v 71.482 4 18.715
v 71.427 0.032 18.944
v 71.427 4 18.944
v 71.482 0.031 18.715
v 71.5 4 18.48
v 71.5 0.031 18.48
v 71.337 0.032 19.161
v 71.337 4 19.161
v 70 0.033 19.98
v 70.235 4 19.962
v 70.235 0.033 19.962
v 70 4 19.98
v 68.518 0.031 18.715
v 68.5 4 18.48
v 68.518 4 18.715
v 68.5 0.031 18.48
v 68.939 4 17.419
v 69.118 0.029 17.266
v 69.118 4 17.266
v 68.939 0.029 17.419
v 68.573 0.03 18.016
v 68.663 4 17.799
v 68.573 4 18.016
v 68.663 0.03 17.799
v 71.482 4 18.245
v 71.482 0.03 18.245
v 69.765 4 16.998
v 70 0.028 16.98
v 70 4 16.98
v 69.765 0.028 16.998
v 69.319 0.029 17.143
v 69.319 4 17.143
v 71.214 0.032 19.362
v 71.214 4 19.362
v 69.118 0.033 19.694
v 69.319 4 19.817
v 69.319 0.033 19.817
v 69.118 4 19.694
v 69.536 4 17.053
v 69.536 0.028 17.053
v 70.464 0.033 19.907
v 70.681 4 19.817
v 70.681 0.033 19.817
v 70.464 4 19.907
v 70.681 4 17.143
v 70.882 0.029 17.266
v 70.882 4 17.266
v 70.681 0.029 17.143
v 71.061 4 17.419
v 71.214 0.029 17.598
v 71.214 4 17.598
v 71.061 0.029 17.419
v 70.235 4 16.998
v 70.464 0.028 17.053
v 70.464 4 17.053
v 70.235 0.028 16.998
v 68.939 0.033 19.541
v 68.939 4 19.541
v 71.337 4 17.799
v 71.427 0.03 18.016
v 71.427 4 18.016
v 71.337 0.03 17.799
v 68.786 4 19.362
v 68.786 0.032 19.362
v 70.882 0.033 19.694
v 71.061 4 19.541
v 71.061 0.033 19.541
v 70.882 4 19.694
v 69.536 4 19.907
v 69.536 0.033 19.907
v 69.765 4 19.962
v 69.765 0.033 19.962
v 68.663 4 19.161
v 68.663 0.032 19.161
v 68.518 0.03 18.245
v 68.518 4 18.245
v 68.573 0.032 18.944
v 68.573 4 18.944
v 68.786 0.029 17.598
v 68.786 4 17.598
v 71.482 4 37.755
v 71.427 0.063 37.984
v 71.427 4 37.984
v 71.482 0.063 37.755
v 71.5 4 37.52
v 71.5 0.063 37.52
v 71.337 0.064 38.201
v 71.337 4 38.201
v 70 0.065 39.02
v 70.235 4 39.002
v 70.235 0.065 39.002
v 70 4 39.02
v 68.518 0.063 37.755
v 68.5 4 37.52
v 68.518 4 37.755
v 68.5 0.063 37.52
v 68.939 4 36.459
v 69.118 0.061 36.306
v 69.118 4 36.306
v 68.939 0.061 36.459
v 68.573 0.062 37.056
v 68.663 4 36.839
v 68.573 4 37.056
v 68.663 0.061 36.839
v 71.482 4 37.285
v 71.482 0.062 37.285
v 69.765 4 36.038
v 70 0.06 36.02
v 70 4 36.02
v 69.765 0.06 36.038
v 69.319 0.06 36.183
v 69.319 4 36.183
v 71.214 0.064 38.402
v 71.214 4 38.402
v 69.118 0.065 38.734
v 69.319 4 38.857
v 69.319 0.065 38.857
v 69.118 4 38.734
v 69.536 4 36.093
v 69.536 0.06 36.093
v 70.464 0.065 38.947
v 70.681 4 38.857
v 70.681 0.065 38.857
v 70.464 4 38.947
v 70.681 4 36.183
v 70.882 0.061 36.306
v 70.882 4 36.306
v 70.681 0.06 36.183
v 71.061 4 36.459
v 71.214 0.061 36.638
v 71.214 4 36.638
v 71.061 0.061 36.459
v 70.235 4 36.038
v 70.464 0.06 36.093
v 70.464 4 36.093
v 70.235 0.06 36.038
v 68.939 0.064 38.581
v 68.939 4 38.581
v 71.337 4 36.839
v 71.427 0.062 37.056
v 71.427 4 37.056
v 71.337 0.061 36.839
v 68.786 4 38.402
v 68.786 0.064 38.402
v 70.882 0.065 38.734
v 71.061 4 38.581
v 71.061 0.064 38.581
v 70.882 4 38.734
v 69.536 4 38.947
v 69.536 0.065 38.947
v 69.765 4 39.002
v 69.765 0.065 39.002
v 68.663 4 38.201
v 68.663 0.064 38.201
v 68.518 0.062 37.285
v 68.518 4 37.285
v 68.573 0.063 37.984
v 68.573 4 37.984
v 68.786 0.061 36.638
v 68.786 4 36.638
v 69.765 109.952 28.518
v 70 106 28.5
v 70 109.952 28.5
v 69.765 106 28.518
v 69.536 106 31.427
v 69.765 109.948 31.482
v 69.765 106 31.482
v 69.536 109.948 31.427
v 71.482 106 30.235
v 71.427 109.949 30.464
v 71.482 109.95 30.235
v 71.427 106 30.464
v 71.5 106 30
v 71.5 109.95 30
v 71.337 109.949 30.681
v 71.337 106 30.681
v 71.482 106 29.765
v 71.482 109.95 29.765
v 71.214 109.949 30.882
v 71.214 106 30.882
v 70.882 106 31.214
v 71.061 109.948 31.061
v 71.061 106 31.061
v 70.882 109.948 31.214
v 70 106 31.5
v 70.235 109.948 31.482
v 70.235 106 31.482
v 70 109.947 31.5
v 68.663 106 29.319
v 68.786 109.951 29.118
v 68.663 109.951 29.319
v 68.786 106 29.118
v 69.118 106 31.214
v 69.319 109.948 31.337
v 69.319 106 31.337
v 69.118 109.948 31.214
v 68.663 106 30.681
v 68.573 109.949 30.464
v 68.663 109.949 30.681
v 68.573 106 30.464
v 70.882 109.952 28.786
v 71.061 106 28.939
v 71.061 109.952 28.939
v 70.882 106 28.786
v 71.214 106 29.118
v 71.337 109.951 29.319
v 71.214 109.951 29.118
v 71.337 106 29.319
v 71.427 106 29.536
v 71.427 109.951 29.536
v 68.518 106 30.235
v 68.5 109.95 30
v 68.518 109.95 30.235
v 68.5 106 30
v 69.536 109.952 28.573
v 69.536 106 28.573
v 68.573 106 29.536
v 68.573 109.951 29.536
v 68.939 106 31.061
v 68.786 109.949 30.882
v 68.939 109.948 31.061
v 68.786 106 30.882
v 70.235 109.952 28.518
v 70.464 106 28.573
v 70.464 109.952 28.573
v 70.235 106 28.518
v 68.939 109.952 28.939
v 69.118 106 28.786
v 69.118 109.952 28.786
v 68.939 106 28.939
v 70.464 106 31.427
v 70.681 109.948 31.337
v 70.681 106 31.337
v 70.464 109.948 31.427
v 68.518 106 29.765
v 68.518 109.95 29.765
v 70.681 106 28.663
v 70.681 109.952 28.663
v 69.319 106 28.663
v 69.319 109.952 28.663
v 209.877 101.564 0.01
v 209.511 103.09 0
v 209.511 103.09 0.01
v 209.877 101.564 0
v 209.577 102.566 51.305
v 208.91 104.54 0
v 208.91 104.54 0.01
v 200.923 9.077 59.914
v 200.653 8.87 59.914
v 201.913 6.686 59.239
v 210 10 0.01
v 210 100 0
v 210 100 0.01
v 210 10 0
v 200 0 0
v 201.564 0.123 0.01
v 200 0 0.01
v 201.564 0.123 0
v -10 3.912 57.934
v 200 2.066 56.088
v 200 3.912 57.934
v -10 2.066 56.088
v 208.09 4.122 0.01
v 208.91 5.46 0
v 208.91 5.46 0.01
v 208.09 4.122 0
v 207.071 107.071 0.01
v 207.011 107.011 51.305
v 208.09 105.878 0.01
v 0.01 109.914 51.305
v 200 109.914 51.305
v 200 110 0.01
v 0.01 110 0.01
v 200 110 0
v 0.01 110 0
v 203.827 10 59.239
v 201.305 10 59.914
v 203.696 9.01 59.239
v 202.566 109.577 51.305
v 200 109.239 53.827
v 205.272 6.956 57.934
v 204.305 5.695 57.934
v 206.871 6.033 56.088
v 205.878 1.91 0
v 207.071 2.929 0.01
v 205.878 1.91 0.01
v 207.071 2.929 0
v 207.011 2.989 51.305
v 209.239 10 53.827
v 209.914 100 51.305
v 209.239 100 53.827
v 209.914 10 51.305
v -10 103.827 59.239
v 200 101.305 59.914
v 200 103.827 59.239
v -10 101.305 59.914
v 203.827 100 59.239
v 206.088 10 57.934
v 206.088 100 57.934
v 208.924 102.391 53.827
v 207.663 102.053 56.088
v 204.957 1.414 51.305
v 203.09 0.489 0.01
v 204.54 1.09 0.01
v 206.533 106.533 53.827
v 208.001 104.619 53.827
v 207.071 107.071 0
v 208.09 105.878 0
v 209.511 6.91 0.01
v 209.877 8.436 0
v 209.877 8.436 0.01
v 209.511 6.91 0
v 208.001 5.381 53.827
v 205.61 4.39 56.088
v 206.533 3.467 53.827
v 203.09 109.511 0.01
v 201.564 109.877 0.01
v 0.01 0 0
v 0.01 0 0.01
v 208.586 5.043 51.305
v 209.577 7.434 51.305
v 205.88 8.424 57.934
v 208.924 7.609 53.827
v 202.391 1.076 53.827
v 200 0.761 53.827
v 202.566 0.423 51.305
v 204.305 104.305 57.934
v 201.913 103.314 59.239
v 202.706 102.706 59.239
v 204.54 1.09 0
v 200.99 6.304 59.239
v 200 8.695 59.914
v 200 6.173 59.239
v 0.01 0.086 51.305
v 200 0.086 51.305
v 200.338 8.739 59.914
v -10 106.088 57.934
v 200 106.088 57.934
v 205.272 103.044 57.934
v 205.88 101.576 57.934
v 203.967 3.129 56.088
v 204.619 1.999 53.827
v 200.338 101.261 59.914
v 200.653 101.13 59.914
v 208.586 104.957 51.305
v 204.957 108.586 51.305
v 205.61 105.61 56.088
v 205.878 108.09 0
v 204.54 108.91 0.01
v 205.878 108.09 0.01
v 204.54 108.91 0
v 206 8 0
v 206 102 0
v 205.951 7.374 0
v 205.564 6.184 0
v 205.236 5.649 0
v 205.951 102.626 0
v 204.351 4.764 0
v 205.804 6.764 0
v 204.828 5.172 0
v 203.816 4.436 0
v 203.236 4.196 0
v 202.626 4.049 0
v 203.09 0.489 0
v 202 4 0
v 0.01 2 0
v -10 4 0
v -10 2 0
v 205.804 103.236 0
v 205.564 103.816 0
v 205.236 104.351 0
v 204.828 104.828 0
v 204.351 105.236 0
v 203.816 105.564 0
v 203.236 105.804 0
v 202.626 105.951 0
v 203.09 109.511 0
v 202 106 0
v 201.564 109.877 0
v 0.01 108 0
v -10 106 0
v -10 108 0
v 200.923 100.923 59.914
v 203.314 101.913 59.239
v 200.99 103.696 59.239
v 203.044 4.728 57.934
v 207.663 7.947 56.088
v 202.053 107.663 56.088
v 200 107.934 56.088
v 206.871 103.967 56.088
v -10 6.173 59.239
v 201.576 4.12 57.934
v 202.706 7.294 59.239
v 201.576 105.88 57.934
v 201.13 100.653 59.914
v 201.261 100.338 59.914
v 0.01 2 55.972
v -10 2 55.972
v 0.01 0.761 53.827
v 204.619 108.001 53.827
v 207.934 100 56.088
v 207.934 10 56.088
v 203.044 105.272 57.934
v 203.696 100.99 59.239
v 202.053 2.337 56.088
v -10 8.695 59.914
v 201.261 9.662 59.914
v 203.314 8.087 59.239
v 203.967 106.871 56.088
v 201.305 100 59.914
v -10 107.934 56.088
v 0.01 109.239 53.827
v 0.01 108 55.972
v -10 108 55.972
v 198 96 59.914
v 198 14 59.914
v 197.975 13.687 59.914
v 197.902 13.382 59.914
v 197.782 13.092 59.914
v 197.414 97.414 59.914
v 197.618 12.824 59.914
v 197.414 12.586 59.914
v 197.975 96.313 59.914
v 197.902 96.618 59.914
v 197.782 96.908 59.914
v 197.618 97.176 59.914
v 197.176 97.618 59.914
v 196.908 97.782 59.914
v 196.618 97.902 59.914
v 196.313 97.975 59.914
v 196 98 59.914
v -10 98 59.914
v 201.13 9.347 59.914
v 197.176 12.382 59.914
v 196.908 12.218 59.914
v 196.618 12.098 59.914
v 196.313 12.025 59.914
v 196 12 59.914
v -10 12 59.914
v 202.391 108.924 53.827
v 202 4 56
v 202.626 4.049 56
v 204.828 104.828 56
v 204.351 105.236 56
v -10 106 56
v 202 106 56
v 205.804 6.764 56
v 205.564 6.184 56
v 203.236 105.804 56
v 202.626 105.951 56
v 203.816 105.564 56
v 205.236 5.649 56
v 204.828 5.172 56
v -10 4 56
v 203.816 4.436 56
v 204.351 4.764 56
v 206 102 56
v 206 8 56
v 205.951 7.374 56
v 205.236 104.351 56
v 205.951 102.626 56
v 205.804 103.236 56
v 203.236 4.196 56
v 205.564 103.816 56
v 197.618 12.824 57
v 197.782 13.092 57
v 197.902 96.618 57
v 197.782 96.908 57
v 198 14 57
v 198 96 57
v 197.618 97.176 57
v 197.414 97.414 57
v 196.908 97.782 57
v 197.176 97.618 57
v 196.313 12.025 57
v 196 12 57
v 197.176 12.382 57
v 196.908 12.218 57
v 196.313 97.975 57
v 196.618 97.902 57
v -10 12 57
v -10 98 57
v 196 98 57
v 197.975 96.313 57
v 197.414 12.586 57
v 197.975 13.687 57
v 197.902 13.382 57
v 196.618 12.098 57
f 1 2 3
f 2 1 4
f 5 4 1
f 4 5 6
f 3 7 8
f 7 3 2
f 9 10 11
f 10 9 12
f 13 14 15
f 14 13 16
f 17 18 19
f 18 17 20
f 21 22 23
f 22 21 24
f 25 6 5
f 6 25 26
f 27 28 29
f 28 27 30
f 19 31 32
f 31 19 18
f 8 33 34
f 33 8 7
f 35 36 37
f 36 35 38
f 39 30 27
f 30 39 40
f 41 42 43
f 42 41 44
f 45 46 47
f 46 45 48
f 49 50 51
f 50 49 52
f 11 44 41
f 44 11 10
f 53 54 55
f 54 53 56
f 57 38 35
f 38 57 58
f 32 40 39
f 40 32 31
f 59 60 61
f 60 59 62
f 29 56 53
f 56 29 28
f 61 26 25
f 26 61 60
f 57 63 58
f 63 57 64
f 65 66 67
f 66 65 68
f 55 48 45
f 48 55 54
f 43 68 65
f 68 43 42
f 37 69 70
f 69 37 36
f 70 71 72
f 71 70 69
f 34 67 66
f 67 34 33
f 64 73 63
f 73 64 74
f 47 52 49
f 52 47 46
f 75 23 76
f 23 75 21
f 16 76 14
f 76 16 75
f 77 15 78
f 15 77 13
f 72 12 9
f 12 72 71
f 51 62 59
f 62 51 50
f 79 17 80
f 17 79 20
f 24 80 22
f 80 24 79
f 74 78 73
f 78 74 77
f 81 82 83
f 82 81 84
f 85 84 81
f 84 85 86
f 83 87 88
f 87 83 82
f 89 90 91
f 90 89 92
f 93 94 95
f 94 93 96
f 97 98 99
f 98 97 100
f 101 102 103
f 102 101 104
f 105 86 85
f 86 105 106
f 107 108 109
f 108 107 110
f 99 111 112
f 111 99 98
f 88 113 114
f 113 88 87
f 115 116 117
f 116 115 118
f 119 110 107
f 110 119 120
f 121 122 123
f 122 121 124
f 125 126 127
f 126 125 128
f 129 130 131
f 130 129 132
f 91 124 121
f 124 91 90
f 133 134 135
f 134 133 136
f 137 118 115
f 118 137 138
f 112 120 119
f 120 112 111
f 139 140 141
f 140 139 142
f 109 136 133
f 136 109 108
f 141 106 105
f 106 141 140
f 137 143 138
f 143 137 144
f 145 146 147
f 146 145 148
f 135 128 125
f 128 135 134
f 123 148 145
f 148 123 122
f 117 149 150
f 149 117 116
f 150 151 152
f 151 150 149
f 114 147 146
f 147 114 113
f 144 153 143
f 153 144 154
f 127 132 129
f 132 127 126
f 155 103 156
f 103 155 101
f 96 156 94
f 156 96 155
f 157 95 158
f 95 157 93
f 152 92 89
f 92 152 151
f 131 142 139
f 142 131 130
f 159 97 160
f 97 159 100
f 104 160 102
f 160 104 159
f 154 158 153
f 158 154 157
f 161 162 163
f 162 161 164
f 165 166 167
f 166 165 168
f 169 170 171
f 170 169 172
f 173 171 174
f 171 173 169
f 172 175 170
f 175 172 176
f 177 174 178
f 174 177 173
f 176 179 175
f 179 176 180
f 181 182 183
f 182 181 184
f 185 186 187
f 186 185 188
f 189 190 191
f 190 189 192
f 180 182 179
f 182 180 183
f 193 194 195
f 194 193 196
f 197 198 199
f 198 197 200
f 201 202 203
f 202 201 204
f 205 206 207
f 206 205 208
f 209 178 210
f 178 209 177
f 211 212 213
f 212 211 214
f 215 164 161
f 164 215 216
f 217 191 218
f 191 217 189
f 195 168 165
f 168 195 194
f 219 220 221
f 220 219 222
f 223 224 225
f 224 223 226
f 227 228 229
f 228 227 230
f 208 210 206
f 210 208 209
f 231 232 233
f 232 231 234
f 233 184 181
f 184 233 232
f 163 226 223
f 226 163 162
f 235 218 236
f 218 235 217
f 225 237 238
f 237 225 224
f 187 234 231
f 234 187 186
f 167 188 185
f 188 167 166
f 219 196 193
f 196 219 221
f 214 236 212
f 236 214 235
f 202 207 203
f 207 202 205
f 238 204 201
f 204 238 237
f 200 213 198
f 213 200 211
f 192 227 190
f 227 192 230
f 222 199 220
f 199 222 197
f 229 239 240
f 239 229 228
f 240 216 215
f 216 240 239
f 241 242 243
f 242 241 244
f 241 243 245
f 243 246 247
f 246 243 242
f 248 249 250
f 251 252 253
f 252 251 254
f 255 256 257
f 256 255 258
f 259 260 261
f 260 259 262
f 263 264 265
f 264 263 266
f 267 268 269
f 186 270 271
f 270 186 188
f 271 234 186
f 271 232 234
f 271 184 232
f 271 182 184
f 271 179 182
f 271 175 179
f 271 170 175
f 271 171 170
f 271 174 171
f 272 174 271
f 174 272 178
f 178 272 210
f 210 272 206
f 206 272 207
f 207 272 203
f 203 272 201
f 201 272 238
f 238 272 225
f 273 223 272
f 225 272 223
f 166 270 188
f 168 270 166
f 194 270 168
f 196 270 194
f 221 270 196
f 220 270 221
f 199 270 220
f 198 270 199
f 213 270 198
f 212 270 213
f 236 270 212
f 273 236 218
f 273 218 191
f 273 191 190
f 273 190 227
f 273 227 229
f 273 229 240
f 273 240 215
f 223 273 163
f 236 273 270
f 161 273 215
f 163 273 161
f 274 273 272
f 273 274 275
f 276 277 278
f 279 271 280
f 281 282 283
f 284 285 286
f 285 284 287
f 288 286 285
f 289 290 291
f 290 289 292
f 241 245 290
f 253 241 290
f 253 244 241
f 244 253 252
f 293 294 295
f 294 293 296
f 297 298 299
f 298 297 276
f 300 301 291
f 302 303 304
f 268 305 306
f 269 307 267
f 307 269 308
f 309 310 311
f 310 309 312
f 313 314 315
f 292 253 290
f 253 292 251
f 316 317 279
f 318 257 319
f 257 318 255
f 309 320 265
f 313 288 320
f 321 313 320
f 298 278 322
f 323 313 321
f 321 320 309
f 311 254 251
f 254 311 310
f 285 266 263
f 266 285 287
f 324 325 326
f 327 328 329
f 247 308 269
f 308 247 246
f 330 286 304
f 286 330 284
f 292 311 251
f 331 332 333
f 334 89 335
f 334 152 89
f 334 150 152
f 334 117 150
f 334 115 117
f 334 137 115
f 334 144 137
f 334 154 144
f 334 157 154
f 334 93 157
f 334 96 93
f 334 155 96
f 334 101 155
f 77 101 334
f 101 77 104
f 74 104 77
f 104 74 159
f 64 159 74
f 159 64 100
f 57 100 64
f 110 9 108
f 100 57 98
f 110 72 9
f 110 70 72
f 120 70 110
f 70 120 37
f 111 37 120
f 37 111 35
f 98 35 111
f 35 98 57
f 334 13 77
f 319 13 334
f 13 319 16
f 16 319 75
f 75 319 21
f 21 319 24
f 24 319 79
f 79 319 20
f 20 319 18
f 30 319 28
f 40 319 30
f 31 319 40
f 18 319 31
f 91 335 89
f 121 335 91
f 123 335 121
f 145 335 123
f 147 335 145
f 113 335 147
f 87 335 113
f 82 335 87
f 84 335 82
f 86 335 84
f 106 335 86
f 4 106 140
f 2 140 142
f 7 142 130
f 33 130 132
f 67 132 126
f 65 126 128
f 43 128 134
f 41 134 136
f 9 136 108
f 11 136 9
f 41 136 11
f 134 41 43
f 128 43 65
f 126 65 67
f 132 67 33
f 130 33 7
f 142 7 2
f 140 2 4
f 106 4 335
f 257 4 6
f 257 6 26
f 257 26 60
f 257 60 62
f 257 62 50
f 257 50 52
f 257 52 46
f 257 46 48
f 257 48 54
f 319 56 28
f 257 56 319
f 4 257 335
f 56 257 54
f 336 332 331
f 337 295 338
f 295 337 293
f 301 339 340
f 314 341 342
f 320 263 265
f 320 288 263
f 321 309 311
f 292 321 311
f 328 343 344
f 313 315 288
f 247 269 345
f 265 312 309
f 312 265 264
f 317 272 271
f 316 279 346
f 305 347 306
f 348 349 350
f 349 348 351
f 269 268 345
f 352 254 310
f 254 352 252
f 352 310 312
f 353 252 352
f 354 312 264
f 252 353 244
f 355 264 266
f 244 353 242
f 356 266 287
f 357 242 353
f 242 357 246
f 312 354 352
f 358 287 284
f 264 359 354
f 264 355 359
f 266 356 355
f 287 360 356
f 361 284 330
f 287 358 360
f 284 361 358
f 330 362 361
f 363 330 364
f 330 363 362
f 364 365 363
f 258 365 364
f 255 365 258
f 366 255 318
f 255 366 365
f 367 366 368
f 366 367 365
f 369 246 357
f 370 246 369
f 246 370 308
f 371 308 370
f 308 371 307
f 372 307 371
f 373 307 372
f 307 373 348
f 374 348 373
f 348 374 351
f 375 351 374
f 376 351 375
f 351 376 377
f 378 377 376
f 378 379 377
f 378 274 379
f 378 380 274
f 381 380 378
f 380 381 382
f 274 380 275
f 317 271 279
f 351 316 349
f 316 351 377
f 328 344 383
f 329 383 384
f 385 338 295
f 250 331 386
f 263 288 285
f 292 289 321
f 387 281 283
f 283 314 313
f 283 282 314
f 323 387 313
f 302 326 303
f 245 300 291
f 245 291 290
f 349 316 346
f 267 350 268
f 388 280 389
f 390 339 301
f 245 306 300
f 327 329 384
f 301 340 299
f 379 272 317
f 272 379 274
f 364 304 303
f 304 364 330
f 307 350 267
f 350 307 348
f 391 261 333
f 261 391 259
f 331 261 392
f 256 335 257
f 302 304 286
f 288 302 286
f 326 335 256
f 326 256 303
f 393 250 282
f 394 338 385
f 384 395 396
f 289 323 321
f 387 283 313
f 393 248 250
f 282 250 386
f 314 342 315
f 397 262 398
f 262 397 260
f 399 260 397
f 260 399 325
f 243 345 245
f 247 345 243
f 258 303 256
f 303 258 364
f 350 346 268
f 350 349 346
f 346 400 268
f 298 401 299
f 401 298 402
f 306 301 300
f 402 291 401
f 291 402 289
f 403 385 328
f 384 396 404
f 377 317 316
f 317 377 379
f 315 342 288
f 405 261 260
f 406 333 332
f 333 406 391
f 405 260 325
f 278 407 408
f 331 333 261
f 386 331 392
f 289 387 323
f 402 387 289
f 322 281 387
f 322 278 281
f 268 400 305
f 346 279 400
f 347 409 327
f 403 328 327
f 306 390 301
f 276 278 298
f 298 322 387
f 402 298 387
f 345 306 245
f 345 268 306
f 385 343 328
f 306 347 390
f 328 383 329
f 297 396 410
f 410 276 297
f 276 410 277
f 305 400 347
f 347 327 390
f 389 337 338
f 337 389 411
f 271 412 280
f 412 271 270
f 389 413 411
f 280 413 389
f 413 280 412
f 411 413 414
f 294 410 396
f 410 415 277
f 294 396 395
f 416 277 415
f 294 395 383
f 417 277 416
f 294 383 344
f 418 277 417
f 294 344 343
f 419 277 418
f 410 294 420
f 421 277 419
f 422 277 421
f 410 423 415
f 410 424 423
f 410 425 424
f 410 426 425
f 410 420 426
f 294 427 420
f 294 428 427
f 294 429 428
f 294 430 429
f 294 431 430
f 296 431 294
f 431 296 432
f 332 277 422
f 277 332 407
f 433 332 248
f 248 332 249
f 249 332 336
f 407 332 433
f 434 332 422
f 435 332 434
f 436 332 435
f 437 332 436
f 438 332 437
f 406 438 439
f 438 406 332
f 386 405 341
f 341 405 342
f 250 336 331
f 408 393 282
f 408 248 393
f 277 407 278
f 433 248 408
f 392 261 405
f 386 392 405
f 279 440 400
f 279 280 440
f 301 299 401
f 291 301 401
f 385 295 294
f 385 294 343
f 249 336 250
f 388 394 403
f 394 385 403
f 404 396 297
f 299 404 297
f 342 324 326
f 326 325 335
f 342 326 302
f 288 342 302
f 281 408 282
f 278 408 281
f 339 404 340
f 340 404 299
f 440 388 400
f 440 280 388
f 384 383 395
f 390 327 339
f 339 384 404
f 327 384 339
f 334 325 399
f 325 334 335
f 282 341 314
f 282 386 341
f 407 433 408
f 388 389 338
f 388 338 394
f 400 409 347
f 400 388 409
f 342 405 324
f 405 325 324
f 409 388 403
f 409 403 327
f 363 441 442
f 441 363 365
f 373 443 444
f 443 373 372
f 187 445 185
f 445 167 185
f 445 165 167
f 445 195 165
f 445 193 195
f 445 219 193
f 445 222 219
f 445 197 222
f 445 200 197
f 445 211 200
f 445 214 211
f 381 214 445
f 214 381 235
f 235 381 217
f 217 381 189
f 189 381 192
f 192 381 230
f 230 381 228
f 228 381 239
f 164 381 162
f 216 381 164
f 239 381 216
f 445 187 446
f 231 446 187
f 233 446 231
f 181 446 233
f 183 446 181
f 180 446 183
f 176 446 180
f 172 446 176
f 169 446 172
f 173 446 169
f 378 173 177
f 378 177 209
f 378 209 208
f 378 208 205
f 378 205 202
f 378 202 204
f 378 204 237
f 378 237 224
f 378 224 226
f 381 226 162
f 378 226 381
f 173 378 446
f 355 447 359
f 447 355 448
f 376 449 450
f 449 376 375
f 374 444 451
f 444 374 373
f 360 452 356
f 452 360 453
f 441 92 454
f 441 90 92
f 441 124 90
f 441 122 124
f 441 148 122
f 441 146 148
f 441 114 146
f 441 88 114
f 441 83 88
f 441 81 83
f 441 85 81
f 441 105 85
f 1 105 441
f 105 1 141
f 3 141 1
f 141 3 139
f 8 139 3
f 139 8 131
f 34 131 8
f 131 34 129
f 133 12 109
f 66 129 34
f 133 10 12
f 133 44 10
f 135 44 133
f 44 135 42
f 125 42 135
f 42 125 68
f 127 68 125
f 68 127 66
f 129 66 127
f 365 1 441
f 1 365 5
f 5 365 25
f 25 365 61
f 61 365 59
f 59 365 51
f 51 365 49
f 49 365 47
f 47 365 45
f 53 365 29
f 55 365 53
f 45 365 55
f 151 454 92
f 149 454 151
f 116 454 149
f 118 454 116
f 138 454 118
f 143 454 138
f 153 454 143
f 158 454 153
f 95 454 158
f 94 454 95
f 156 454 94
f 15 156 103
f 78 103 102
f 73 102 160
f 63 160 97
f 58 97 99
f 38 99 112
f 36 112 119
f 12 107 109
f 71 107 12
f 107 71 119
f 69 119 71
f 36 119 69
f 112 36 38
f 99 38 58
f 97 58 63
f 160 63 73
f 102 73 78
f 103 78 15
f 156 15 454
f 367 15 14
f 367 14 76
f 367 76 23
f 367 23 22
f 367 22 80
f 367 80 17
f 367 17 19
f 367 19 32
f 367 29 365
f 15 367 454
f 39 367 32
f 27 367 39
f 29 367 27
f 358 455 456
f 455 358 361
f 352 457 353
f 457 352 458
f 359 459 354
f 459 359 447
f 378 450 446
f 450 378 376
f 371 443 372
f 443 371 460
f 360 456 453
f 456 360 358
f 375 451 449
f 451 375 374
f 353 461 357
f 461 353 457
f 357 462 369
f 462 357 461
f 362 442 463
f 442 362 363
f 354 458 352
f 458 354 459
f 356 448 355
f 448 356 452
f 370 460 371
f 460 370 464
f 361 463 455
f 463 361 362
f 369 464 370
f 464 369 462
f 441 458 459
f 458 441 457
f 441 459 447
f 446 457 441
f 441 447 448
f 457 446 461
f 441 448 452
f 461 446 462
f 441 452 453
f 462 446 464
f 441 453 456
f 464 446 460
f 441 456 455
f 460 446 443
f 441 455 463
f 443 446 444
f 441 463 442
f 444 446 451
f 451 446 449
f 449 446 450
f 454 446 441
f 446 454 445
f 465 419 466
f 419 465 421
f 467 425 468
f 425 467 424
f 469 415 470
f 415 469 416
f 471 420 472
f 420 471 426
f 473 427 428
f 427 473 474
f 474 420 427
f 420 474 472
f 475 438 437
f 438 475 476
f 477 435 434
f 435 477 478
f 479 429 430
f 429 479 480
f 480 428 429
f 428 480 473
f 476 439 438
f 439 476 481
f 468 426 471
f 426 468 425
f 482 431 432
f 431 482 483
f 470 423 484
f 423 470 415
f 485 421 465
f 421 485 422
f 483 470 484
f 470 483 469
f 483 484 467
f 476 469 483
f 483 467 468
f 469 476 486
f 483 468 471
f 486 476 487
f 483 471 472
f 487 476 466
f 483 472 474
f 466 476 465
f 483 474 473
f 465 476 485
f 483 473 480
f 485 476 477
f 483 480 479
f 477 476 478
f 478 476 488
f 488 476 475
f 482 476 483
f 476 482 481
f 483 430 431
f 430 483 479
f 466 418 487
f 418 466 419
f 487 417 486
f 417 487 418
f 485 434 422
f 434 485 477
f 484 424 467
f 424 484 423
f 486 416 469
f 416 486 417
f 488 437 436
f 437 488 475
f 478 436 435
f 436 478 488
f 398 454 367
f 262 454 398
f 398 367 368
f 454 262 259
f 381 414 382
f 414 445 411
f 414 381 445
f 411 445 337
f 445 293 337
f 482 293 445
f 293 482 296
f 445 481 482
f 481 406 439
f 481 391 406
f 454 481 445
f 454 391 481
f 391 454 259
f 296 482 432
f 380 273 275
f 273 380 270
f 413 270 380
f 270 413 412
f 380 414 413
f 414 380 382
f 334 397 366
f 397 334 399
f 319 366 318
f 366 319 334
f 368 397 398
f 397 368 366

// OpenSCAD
include <protective_storage_box.scad>
lid_angle = 0;
show_tray_in_assembly = false;
render_assembly = false;
rotate([180, 0, 0]) translate([0, -width, -lid_h]) box_lid_right();
